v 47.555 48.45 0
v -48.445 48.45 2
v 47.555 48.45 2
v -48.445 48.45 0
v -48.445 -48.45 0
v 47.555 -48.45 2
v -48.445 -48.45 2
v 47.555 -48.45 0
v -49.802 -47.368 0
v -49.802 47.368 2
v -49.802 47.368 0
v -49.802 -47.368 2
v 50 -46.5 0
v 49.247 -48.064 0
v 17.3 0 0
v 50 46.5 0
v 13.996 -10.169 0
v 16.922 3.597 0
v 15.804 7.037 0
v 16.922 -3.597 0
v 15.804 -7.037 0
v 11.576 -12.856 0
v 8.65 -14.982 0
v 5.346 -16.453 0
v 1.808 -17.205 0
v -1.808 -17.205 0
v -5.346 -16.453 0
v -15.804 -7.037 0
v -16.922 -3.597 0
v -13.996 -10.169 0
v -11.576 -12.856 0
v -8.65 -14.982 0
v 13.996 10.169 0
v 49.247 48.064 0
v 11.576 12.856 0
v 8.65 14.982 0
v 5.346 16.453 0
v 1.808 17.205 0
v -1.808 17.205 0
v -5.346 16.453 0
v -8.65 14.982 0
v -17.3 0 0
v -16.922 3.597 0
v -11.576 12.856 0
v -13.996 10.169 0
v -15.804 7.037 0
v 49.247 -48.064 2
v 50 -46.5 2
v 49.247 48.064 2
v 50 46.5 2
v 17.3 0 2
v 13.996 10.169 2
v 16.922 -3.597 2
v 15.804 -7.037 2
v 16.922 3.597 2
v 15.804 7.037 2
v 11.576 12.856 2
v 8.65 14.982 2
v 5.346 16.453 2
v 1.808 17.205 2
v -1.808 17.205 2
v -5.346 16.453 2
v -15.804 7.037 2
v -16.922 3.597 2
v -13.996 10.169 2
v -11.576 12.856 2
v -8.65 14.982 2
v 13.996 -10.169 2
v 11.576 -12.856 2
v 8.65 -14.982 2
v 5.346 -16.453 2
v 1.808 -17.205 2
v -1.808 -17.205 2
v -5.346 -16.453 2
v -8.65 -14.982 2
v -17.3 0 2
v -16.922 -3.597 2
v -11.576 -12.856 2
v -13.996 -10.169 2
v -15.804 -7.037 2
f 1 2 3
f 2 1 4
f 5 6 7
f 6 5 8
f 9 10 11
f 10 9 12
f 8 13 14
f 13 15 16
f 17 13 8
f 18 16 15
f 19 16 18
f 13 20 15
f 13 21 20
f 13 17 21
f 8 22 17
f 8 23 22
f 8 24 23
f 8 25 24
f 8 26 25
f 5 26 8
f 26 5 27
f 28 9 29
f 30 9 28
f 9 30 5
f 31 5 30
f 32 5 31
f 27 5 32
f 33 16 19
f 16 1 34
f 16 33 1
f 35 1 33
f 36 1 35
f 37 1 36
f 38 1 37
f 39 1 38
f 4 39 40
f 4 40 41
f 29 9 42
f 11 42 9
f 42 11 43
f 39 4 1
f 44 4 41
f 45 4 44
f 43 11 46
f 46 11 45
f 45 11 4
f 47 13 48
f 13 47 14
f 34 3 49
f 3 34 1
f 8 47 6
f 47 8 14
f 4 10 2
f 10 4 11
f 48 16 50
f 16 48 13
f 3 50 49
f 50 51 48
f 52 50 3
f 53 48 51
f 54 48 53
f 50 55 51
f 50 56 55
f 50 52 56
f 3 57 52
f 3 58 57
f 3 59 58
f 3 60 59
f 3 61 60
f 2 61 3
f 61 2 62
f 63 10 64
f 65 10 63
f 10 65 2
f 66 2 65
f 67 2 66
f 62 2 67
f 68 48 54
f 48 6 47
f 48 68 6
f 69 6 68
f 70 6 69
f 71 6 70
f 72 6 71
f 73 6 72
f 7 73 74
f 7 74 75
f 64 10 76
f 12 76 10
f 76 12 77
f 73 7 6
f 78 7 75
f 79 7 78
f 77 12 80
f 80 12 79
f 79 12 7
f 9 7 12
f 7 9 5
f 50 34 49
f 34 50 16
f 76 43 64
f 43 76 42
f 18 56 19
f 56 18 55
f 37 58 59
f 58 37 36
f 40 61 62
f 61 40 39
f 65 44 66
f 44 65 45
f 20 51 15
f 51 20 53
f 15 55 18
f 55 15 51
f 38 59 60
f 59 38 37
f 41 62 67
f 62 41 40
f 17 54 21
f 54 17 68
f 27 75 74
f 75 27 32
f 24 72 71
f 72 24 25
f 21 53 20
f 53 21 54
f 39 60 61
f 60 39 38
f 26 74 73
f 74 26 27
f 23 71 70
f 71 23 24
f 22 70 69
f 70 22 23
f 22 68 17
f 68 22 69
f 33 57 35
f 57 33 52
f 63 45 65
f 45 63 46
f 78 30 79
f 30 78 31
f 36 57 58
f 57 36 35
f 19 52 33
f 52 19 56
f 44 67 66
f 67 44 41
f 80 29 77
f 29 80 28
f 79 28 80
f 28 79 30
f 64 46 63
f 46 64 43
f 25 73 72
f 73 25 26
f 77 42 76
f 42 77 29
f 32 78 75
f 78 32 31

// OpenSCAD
// file: config_4x5.scad
/*
This is the base configuration file for the 4x5" format
# we are not using the exact ANSI measures, but slightly rounded measures for slight simplification
*/
vStabilizerTotal_h = 7;

// general tolerance
vTolerance = 0.2;

// sheet film and cassette measurements (roughly based on the ANSI measurements)
vFilmSheet_l = 127;
vFilmSheet_w = 102;
vCassette_l = 160; // A min
vCassette_w = 121; // B max
vCassette_h = 13.2; // C max
vLightTrap_l = 2; // M2
vLightTrap_w = vCassette_w;
vLightTrap_h = 1.5; // M1
vLightTrap_offsetX = 141; // G max
vFilmWindow_l = 121;
vFilmWindow_w = 101;
vFilmWindow_offsetX = 16;
vGroundGlass_offsetZ = 5;

// Graflok
vGraflok_h = 6; // this is not the official measurement, just measured from a camera 

// lens board measures (we are using Wista/Technika-style lensboards)
vLensboard_l = 100;
vLensboard_w = 97;
vLensboard_h = 2;
vLensboard_offsetX = -(vLensboard_l+3)/2; // caution: we have an asymetric offset!
vLensboard_offsetY = -vLensboard_w/2;
vLensboardHole_d = 85;
vLensboardLighttrap_d = 89;
vLensboardLighttrap_h = 1+vTolerance;

// bellows frame measures - the bellows frame design is derived from standardcameras.com
// back frame
vBellowsBackInner_l = 144; //???? check and replace with the measurement from your bellows!
vBellowsBackInner_w = vBellowsBackInner_l;
vBellowsBackOuter_l = vBellowsBackInner_l+1;
vBellowsBackOuter_w = vBellowsBackOuter_l;

vBellowsBackFrameOuter_l = 159;
vBellowsBackFrameOuter_w = vBellowsBackFrameOuter_l;
vBellowsBackFrameOuter_h = 7;
vBellowsBackFrameInner_l = 135;
vBellowsBackFrameInner_w = vBellowsBackFrameInner_l;
vBellowsBackFrameInner_h = 5;

vBellowsBackLightTrapOuter_l = vBellowsBackFrameInner_l+2*2;
vBellowsBackLightTrapOuter_w = vBellowsBackLightTrapOuter_l;
vBellowsBackLightTrap_h = 3;

//vBellowsBackFrameScrewHole_d = 2;
//vBellowsBackFrameScrewHole_h = 10;
vBellowsBackFrameScrewHole_offsetXY = 70;
vBellowsBackFrameScrewHole_offsetZ = vBellowsBackFrameOuter_h/2;

// front frame
vBellowsFrontInner_l = 94; //???? check and replace with the measurement from your bellows!
vBellowsFrontInner_w = vBellowsFrontInner_l;
vBellowsFrontOuter_l = vBellowsFrontInner_l+1;
vBellowsFrontOuter_w = vBellowsFrontOuter_l;

vBellowsFrontFrameOuter_l = 104;
vBellowsFrontFrameOuter_w = vBellowsFrontFrameOuter_l;
vBellowsFrontFrameOuter_h = 7;
vBellowsFrontFrameInner_l = 82;
vBellowsFrontFrameInner_w = vBellowsFrontFrameInner_l;
vBellowsFrontFrameInner_h = 5;

vBellowsFrontLightTrapOuter_l = vBellowsFrontFrameInner_l+2*2;
vBellowsFrontLightTrapOuter_w = vBellowsFrontLightTrapOuter_l;
vBellowsFrontLightTrap_h = 0;

//vBellowsFrontFrameScrewHole_d = 2;
//vBellowsFrontFrameScrewHole_h = 10;
vBellowsFrontFrameScrewHole_offsetXY = 40;
vBellowsFrontFrameScrewHole_offsetZ = vBellowsFrontFrameOuter_h/2;

// body dimensions
vWall_strength = 5;
vBodyOuter_l = 185; // make sure this is at least 4*vWall_strength larger than vBellowsBackFrameOuter_l!
vBodyOuter_w = 170; // make sure this is at least 2*vWall_strength larger than vBellowsBackFrameOuter_l!
vBodyOuter_h = 65;
vBodyEdge_r = vWall_strength;

// we will center our model on the Y axis and on the center of the bellows frame
// at least for the 4x5 version, we have to do an asymetric offset of 2.5mm on the X-axis 
vAsymOffsetX = -2.5;  

// back plate
vBackPlateLength = 160; // we will probably use about the same size as the bellows back frame
vBackPlateStrength = vWall_strength;

// hinges for front lid
vHingeInnerDistance = 100;
vHingeBaseWidth = 20;
vHingeHole = 4;

// lid lock measures
vLidLockBase_d = 8;
vLidLockHole_distance = 70;

// rail dimensions
vLowerRail_w = 90;
vUpperRail_w = vLowerRail_w;

// cutout for stop indents
vStopIndent_l = 4;
vStopIndent_h = 5;
vStopIndentDistance = 25; // shorter than 25 is not necessary
vStopIndent_offsetX = 20; // don't go shorter than 20 if you intend to use a 90mm lens!

// for all dovetails we use a base width of 5mm and a base height of 5mm
// we are applying tolerances to the inner AND outer part of a dovetail, in width and height
vDoveTail_w = 5;
vDoveTail_h = 5;
vDoveTail_tolerance = 0.2;

// front standard carrier / slider
// width is depending on vUpperRail_w
vSliderBase_w = vUpperRail_w + (4*vDoveTail_w);
vSliderBase_l = 40; // make sure to have enough space in the body.


// lever plate 
vLeverPlateBase_w = vUpperRail_w - (8*vDoveTail_w);
vLeverPlateBlock_w = 25;
vLeverPlateBlock_l = vSliderBase_l-(2*vDoveTail_w);

vFrontStandard_h = 130;
vFrontStandardSlot_h = vFrontStandard_h - 30;

// lensboard carrier
vFrontPlate_length = vSliderBase_w+6; // vSliderBase_w is a bit too tight for 4x5", so there we will add 5mm, for 5x7 vSliderBase_w is OK to get a squared lensboard carrier
vFrontPlate_width = vSliderBase_w; //vFrontPlate_length;
vFrontPlate_height = 16;
vEdgeCutCylinder = floor(sqrt(2*pow(vFrontPlate_width,2)))-5;

vTiltDovetailBase_d1 = 30;
vTiltDovetailBase_d2 = vTiltDovetailBase_d1+(2*vDoveTail_w);
vTiltDovetailBaseBlock_d = vTiltDovetailBase_d1+(4*vDoveTail_w);

vTiltDovetail_d1 = vTiltDovetailBase_d1-vTolerance;
vTiltDovetail_d2 = vTiltDovetailBase_d2-vTolerance;
vTiltDovetail_h = vDoveTail_w-vTolerance;

vTiltDovetailCutout_d1 = vTiltDovetailBase_d2+vTolerance;
vTiltDovetailCutout_d2 = vTiltDovetailBase_d1+vTolerance;

vAxisHole_d = 10+vTolerance;
vAxisHole_h = vDoveTail_w+vTolerance;

vTiltLockBolt_d = 12;
vTiltLockBolt_h = 14;
//vTiltLockBoltHole_d = 8;
//vTiltLockBoltHole_h = vTiltLockBolt_h;

vTiltHeight = 50;
vTiltRadius = vFrontPlate_length/2;
vTiltAngleMinus = -7;
vTiltAnglePlus = 7;
vTiltAxis_d = 10-vTolerance;

// focusing rod
vFocusingRod_d = 6;
vFocusingKnob_d = 25;
vFocusingKnob_h = 20;

// stabilizer measures (just the outer measures of our stabilizer block, not the tripod slider)
vStabilizerBase_l = 135;
vStabilizerBase_w = 90;  
vStabilizerBase_h = 7;
vStabilizerDovetailBase_w = 50;
// screw holes for the stabilizer
vLidHoleCount_x = 4;
vLidHoleDist_x = 35;
vLidHoleCount_y = 2;
vLidHoleDist_y = 60;


// screw diameters, length is individually set
vScrew1Hole_d = 3;
vScrew1ThreadHole_d = 2.2;
vScrew2Hole_d = 2;
vScrew2ThreadHole_d = 1.4;


// Dimensions for small heat set insert holes.
// Sized for M2 inserts, 3 mm depth, 3.5 mm max OD
// (may be labelled M2x3.5x3)
vInsertM2Hole_d = 3.2;
vInsertM2MinDepth_h = 4.0;
vInsertM2Size_d = 3.5;
vInsertM2Depth_h = 3.0;

// Dimensions for heat set insert holes.
// Sized for "Voron standard" M3 inserts, 4 mm depth, 5 mm max OD
// (variously labelled M3x4x5 or M3x5x4)
vInsertM3Hole_d = 4.7;
vInsertM3MinDepth_h = 5.0;
vInsertM3Size_d = 5.0;
vInsertM3Depth_h = 4.0;

// Dimensions for large heat set insert holes.
// Sized for M5 inserts, 5 mm depth, 7 mm max OD
// (may be labelled M5x7x5)
vInsertM5Hole_d = 6.7;
vInsertM5MinDepth_h = 6.0;
vInsertM5Size_d = 7.0;
vInsertM5Depth_h = 5.0;
// file: baseconfig.scad
/*
Here we define some variables which are independent from the camera format
*/


// some generic variables

// we are including a format specific configuration sheet - but make sure to include only one!

include <config_4x5.scad>;
// include <config_5x7.scad>;
// include <config_8x10.scad>;

// Arca Swiss tripod plate
// caution: some Arca Swiss compatible tripod heads may have slight variations
// vArca_length = xx; // the length is irrelevant here
vArca_width = 38;
vArca_height = 7;
vArcaBase_cutout = 4;
vArcaBase_height = 1.5;
// main file
// loading the base configuration
include <baseconfig.scad>;

vOuterSize_w = vLensboard_l;
vOuterSize_h = vLensboard_w;
vHoleSize_d = 34.6;
vThickness_d = vLensboard_h;
vFillet_r = 2.0;

vOffset_w = vOuterSize_w/2-vFillet_r;
vOffset_h = vOuterSize_h/2-vFillet_r;

module lensboard() {

difference() {
    hull() {
        translate([vOffset_w, vOffset_h, 0]) cylinder(h=vThickness_d, r=vFillet_r);
        translate([-vOffset_w, vOffset_h, 0]) cylinder(h=vThickness_d, r=vFillet_r);
        translate([vOffset_w, -vOffset_h, 0]) cylinder(h=vThickness_d, r=vFillet_r);
        translate([-vOffset_w, -vOffset_h, 0]) cylinder(h=vThickness_d, r=vFillet_r);
    };
    
    translate([0, 0, -1]) cylinder(h=vThickness_d+2, d=vHoleSize_d);
}
 
}

lensboard();
